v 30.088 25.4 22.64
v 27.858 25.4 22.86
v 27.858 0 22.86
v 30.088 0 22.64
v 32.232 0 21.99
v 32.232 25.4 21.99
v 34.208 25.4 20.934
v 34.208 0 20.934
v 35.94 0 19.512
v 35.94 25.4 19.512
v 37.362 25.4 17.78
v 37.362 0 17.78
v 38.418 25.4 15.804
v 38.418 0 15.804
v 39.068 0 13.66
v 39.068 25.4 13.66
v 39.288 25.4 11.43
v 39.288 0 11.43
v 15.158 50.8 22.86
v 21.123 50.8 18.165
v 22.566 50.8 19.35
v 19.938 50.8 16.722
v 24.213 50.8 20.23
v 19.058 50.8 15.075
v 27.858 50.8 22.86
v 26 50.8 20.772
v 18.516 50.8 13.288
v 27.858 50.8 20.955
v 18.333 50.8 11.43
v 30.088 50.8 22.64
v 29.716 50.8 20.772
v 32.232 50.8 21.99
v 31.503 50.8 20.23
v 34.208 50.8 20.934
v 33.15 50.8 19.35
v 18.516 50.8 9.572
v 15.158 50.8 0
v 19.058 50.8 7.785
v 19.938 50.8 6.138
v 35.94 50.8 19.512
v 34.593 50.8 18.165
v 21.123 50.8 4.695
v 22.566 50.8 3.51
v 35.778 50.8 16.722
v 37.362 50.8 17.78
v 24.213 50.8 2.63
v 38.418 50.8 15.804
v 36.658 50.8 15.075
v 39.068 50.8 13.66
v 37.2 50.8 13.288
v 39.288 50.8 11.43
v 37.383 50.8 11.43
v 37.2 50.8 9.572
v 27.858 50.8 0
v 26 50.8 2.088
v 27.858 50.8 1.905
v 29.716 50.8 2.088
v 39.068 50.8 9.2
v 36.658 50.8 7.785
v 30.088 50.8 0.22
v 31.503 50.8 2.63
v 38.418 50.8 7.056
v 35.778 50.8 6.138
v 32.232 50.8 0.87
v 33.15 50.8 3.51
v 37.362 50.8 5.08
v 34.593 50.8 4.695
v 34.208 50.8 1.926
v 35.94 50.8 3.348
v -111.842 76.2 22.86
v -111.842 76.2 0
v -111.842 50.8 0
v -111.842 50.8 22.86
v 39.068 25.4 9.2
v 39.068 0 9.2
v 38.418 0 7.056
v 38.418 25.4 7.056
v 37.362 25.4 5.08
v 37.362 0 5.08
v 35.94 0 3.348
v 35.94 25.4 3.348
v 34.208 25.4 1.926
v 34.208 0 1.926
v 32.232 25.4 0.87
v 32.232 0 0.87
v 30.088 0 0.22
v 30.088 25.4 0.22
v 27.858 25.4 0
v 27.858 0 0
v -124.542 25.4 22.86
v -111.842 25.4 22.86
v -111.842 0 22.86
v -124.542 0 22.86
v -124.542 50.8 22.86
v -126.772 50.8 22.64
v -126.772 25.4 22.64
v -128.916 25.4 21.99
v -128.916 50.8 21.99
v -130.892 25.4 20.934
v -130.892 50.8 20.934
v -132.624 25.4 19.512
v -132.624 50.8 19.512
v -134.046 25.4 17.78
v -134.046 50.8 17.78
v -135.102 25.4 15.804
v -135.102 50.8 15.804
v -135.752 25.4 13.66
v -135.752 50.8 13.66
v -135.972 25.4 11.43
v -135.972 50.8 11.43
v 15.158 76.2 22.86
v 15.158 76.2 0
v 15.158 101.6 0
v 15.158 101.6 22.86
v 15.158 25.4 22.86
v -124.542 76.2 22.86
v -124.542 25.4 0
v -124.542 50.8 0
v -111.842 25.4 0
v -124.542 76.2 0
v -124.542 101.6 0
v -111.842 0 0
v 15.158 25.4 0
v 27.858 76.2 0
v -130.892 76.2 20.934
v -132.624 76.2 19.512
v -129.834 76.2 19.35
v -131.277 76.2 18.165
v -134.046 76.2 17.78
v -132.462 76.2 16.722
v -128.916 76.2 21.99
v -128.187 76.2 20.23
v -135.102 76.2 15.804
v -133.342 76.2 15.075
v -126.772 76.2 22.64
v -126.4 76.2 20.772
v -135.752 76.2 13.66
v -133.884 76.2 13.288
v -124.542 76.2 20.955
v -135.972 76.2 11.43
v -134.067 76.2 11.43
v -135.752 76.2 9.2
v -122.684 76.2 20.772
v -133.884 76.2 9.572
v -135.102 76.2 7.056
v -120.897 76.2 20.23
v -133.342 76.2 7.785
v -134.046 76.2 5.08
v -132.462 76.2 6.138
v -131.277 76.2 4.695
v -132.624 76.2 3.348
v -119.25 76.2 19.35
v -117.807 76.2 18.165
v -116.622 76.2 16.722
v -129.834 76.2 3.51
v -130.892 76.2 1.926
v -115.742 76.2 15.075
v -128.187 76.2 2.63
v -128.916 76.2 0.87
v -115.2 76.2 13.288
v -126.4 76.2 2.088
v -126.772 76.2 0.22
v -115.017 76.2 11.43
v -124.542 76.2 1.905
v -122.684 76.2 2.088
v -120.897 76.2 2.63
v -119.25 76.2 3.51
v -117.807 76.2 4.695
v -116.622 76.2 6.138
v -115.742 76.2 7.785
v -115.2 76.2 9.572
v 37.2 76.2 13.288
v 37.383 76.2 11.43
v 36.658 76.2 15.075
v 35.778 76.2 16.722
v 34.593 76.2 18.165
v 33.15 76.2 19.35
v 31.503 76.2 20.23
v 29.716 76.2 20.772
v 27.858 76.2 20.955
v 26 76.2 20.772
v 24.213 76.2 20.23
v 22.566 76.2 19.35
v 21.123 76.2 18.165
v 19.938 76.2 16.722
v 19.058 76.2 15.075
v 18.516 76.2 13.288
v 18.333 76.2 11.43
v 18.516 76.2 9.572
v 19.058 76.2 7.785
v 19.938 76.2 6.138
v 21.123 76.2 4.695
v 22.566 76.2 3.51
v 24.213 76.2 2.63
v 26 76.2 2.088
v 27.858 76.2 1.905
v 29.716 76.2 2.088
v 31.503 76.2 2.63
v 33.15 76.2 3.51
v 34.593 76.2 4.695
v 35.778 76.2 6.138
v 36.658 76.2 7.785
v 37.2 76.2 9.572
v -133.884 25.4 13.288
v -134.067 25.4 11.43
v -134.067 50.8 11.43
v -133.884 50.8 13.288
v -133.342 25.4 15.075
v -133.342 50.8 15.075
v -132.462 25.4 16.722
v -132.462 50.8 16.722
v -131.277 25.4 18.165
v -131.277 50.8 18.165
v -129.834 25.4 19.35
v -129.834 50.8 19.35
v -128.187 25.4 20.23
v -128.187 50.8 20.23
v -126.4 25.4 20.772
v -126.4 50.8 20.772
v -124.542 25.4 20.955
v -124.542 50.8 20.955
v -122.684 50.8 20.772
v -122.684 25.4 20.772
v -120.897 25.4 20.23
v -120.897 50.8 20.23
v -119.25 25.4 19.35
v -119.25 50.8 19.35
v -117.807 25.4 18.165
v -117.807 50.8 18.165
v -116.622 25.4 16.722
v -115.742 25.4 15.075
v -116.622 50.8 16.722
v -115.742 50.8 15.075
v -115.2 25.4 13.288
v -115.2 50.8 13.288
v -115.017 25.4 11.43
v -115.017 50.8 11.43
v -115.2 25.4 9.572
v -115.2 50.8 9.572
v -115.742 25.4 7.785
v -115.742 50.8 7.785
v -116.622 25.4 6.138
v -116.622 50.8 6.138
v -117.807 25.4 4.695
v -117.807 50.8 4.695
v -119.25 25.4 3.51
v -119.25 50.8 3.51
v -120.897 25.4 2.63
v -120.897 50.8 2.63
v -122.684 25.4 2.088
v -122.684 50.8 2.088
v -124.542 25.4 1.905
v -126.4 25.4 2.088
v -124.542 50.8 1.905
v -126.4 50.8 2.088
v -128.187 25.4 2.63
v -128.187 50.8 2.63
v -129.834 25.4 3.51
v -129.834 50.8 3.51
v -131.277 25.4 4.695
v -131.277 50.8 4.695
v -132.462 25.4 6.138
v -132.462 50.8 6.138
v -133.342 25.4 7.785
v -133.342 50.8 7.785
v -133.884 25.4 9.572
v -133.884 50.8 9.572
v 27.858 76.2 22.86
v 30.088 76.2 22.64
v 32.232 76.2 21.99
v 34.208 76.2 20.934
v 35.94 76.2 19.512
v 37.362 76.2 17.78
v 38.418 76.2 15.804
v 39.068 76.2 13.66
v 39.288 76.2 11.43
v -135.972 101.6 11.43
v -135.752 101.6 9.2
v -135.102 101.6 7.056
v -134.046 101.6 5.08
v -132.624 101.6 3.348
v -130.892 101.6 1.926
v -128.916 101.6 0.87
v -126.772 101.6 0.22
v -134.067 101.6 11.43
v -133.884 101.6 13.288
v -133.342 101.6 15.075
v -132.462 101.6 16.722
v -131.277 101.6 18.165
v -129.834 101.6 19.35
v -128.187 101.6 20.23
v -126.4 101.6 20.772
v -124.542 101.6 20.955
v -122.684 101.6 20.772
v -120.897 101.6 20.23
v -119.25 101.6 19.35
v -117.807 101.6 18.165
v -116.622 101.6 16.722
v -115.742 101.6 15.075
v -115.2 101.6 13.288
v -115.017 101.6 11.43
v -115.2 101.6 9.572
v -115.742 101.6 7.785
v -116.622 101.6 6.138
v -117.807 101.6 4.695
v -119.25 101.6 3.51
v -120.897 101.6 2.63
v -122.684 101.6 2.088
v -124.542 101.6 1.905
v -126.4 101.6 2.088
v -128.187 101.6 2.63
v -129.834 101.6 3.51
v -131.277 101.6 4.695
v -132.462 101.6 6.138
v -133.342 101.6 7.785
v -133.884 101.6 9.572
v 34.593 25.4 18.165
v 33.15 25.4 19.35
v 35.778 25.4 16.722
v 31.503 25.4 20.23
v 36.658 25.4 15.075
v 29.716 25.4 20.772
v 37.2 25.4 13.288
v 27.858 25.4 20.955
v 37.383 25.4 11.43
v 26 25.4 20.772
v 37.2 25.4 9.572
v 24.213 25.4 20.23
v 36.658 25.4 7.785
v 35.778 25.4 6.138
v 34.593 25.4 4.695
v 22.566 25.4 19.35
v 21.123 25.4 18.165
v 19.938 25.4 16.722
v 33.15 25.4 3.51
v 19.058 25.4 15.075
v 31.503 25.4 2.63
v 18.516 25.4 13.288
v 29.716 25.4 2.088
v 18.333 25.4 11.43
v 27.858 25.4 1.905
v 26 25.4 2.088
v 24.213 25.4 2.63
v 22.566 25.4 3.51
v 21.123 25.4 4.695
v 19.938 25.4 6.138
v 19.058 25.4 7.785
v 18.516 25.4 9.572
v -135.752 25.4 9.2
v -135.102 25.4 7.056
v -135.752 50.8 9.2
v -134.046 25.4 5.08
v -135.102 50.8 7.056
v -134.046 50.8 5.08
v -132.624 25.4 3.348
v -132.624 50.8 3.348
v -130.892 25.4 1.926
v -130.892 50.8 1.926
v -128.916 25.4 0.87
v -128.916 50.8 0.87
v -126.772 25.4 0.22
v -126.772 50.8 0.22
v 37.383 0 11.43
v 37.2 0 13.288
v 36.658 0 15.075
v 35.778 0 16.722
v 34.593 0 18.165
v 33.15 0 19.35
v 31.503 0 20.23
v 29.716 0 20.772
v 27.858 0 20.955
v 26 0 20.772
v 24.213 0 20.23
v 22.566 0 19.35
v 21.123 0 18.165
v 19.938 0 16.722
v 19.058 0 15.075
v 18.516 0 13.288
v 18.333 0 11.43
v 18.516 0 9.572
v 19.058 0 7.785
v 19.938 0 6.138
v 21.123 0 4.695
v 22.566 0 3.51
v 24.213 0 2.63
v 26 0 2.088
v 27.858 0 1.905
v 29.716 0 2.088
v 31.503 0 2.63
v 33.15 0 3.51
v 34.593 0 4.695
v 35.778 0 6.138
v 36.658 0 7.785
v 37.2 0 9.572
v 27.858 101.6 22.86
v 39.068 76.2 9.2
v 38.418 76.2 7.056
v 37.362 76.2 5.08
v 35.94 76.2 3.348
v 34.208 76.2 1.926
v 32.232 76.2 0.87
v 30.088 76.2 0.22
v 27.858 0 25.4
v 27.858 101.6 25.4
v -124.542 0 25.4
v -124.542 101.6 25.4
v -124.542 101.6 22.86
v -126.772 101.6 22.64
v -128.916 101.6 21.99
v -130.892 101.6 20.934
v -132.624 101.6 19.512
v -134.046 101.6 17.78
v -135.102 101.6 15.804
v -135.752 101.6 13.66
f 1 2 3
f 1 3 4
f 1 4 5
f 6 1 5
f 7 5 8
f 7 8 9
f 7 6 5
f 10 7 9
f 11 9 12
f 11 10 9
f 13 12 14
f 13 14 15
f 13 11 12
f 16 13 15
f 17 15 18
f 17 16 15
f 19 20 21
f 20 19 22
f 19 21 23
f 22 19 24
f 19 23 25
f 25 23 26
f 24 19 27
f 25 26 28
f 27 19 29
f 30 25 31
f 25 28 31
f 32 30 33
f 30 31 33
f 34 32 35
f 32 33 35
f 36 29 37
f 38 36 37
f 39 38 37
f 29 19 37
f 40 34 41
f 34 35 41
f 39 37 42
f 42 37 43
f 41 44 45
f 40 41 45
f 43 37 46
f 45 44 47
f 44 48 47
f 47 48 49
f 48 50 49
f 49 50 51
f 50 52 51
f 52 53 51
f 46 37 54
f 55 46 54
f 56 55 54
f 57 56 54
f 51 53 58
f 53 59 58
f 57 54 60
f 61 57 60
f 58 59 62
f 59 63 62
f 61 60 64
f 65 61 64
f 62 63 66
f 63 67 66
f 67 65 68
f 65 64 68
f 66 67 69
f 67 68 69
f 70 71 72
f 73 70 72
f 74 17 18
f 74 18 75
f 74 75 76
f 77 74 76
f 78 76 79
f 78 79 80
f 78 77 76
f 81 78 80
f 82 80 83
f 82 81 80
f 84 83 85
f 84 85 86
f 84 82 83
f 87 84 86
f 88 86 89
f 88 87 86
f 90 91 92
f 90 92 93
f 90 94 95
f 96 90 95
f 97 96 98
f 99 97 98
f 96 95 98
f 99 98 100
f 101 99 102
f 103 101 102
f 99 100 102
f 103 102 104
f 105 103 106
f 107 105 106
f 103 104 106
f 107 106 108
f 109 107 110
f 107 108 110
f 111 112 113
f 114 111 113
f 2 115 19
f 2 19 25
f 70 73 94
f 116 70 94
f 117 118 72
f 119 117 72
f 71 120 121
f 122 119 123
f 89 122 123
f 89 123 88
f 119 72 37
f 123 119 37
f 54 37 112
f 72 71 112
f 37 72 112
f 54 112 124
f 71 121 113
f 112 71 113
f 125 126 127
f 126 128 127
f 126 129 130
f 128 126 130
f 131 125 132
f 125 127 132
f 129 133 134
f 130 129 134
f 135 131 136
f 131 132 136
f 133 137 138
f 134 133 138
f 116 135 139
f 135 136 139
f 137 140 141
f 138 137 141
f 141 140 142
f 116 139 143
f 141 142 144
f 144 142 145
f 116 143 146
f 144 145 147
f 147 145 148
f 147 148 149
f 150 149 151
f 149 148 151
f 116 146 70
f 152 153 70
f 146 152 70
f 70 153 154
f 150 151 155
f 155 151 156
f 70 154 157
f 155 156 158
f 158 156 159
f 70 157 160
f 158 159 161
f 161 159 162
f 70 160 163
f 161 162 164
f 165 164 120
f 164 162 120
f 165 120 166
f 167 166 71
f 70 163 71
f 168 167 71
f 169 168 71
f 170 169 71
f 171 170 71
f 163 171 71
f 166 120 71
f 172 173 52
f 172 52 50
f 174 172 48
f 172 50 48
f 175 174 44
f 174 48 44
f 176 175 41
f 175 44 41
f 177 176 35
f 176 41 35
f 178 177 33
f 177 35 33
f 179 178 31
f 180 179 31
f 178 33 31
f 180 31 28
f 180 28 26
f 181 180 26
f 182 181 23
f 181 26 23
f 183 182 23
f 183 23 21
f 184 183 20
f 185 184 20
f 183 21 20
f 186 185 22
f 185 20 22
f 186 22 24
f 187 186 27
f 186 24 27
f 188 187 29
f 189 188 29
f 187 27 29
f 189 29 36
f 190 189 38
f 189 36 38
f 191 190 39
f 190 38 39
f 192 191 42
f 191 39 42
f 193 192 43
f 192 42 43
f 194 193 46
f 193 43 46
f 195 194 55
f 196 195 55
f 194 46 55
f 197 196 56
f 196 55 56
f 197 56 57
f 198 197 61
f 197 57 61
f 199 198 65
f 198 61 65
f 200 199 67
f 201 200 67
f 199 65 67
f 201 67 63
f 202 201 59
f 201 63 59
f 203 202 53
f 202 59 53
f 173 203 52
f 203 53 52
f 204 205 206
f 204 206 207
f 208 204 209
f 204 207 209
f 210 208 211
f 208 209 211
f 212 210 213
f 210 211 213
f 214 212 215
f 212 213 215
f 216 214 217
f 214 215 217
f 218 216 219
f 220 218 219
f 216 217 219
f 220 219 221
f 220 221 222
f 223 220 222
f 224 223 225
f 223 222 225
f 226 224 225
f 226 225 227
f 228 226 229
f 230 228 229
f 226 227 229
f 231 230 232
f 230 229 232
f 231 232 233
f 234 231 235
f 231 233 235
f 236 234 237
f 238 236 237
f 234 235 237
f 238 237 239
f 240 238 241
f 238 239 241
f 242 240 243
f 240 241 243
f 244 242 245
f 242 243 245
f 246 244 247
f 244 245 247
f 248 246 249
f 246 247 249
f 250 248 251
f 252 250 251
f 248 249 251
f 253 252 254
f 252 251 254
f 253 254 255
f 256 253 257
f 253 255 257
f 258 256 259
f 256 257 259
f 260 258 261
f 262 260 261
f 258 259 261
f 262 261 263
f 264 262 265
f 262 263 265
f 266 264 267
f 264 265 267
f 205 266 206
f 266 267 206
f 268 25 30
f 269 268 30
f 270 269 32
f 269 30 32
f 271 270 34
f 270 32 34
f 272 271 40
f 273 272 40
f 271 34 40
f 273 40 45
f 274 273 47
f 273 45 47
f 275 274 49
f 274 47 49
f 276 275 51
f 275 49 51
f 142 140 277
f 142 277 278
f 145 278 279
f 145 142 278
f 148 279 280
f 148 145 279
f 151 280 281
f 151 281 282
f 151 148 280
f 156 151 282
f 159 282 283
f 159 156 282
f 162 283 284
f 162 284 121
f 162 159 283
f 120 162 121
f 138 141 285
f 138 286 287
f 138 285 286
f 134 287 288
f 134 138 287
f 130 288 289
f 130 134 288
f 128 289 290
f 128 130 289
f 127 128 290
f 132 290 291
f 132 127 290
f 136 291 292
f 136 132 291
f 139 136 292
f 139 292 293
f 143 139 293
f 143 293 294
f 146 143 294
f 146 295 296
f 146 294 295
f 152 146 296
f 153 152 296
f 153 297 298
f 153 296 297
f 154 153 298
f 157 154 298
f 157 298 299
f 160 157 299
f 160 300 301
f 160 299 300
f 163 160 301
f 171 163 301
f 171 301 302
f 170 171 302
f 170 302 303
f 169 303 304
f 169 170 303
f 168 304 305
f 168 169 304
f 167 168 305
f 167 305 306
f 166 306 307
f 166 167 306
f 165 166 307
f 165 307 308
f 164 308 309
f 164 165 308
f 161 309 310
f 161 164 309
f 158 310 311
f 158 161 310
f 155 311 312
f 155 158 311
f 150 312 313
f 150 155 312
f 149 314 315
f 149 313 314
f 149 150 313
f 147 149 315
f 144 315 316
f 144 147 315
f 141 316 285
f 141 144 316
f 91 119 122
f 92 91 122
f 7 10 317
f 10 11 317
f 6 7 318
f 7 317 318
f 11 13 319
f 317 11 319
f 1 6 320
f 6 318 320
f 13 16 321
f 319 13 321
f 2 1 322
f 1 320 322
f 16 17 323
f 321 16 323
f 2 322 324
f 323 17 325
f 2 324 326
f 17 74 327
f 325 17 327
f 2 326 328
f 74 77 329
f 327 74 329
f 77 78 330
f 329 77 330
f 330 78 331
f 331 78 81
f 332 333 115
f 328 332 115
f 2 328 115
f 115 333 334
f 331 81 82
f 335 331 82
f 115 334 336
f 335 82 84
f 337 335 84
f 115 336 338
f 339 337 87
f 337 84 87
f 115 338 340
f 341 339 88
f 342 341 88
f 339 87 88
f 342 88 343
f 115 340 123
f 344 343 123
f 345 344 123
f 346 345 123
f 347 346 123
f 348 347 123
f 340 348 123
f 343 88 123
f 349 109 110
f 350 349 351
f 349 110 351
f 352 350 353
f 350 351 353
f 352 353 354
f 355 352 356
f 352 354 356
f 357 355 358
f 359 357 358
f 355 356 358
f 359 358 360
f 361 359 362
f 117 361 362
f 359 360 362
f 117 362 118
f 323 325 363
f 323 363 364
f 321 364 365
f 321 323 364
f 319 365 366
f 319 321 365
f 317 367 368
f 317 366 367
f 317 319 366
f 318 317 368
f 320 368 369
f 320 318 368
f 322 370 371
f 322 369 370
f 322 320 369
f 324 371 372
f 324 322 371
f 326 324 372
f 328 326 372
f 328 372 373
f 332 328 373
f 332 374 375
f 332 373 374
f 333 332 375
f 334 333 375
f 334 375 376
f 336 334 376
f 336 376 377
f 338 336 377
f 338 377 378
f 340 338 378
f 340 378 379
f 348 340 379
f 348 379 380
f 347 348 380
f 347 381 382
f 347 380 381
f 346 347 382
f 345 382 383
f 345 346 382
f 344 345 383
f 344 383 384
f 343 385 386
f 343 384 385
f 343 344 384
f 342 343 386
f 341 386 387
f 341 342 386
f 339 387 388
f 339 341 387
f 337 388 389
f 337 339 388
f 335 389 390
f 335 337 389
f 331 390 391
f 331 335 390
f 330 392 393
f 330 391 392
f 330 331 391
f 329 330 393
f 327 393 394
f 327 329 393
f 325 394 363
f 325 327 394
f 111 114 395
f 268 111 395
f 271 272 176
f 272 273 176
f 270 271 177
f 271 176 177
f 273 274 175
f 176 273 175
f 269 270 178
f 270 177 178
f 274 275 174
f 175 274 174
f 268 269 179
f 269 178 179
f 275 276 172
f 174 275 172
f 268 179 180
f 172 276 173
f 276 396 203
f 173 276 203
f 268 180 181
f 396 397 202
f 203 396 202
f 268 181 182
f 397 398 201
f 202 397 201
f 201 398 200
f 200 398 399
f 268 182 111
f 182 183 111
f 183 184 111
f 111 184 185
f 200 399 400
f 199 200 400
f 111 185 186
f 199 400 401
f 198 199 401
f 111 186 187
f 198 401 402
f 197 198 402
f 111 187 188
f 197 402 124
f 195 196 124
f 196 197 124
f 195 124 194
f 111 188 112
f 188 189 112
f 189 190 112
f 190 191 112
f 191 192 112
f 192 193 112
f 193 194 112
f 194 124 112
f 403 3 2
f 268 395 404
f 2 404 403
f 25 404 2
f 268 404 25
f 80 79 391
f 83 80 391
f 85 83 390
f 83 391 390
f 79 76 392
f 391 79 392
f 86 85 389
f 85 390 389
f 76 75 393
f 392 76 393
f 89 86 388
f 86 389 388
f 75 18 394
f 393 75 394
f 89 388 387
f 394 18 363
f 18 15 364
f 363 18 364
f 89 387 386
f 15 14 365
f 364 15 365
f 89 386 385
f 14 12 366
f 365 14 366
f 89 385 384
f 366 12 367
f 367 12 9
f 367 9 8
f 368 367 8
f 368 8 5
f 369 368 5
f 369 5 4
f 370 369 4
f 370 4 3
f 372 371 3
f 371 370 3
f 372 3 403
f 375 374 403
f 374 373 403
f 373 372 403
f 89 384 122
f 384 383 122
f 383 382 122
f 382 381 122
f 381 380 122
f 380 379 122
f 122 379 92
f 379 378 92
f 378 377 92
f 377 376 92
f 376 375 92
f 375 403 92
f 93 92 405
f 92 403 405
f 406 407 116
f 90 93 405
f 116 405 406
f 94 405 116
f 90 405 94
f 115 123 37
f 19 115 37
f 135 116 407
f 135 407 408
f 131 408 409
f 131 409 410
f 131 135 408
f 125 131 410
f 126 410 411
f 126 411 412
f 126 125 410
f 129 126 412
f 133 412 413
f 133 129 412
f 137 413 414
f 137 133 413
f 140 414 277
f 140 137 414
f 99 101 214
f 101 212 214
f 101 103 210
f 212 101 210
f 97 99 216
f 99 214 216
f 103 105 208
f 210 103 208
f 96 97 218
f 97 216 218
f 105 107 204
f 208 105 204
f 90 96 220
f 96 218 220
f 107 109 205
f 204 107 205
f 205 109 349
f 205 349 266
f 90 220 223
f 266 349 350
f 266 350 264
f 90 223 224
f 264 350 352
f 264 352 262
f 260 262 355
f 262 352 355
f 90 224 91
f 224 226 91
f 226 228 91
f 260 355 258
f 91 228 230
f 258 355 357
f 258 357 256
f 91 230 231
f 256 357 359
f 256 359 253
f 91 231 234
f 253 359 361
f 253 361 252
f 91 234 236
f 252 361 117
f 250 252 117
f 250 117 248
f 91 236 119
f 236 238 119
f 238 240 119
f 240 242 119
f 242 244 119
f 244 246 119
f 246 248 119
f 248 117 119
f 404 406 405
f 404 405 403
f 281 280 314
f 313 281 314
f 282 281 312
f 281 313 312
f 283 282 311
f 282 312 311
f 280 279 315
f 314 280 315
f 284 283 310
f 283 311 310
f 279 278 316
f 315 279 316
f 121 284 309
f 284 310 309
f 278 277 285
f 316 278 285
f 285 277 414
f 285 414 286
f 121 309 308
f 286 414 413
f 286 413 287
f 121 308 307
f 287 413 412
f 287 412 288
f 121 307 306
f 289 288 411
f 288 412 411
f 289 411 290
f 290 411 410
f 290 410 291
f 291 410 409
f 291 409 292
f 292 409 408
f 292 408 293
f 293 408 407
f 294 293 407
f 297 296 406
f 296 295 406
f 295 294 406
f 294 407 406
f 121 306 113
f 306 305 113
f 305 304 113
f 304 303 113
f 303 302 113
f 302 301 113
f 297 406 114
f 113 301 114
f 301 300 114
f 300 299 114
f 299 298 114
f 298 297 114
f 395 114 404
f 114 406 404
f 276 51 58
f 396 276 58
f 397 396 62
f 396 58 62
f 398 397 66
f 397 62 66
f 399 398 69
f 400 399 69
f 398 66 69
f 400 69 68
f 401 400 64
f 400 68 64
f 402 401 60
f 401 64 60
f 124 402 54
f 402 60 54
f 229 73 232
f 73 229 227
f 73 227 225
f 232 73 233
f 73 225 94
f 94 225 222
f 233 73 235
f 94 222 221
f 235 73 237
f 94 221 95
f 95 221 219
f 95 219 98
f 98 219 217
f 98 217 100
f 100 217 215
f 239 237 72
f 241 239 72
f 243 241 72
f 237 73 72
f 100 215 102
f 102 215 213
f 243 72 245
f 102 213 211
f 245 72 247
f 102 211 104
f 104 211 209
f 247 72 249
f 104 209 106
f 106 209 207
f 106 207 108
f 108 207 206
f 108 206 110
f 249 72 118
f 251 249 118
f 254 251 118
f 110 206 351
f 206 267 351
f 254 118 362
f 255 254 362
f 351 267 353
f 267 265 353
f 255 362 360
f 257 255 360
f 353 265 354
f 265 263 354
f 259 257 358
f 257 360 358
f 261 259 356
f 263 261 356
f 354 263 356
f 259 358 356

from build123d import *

# Parameters (mm, degrees)
F1_DEPTH      = 25.4
F3_DEPTH      = 25.4
F3_DEPTH_BACK = 50.801
F2_R          = 9.525
F4_DEPTH      = 25.4
F4_DEPTH_BACK = 50.801
F2_W          = 12.7
F2_H          = 2.54
F5_DEPTH      = 25.4
F5_DEPTH_BACK = 50.8
F7_DEPTH      = 25.4
F7_DEPTH_BACK = 50.801
F6_R          = 9.525
F8_DEPTH      = 25.4
F8_DEPTH_BACK = 50.801
F6_W          = 12.7
F6_H          = 2.54
F9_DEPTH      = 25.4
F9_DEPTH_BACK = 50.8


with BuildPart() as f1:
    # F0 (on Top) → F1 (new body)
    with BuildSketch(Plane.XY):
        Polygon((15.1580646015, 101.6), (-137.2419353985, 101.6), (-137.2419353985, 76.2), (-111.8419353985, 76.2), (-111.8419353985, 50.8), (-137.2419353985, 50.8), (-137.2419353985, 25.4), (-111.8419353985, 25.4), (-111.8419353985, 0), (40.5580646015, 0), (40.5580646015, 25.4), (15.1580646015, 25.4), (15.1580646015, 50.8), (40.5580646015, 50.8), (40.5580646015, 76.2), (15.1580646015, 76.2), align=None)
    extrude(amount=F1_DEPTH)

    # F2 (on face) → F3 (cut, two sides)
    with BuildSketch(Plane(origin=(0, 50.8, 0), x_dir=(-1, 0, 0), z_dir=(0, 1, 0))) as f3_sk:
        with BuildLine():
            ThreePointArc((124.5419353985, 22.86), (132.6241659074, 19.512230509), (135.9719353985, 11.43))
            ThreePointArc((135.9719353985, 11.43), (132.6241659074, 3.347769491), (124.5419353985, 0))
            Line((124.5419353985, 0), (137.2419353985, 0))
            Line((137.2419353985, 0), (137.2419353985, 25.4))
            Line((137.2419353985, 25.4), (124.5419353985, 25.4))
            Line((124.5419353985, 25.4), (124.5419353985, 22.86))
        make_face()
    extrude(amount=-F3_DEPTH, mode=Mode.SUBTRACT)
    extrude(f3_sk.sketch, amount=F3_DEPTH_BACK, mode=Mode.SUBTRACT)

    # F2 (on face) → F4 (cut, two sides)
    with BuildSketch(Plane(origin=(0, 50.8, 0), x_dir=(-1, 0, 0), z_dir=(0, 1, 0))) as f4_sk:
        with Locations((124.5419353985, 11.43)):
            Circle(F2_R)
    extrude(amount=-F4_DEPTH, mode=Mode.SUBTRACT)
    extrude(f4_sk.sketch, amount=F4_DEPTH_BACK, mode=Mode.SUBTRACT)

    # F2 (on face) → F5 (join, two sides)
    with BuildSketch(Plane(origin=(0, 50.8, 0), x_dir=(-1, 0, 0), z_dir=(0, 1, 0))) as f5_sk:
        with Locations((118.1919353985, 24.13)):
            Rectangle(F2_W, F2_H)
    extrude(amount=F5_DEPTH)
    extrude(f5_sk.sketch, amount=-F5_DEPTH_BACK)

    # F6 (on face) → F7 (cut, two sides)
    with BuildSketch(Plane.XZ.offset(-50.8)) as f7_sk:
        with BuildLine():
            ThreePointArc((27.8580646015, 22.86), (35.9402951105, 19.512230509), (39.2880646015, 11.43))
            ThreePointArc((39.2880646015, 11.43), (35.9402951105, 3.347769491), (27.8580646015, 0))
            Line((27.8580646015, 0), (40.5580646015, 0))
            Line((40.5580646015, 0), (40.5580646015, 25.4))
            Line((40.5580646015, 25.4), (27.8580646015, 25.4))
            Line((27.8580646015, 25.4), (27.8580646015, 22.86))
        make_face()
    extrude(amount=-F7_DEPTH, mode=Mode.SUBTRACT)
    extrude(f7_sk.sketch, amount=F7_DEPTH_BACK, mode=Mode.SUBTRACT)

    # F6 (on face) → F8 (cut, two sides)
    with BuildSketch(Plane.XZ.offset(-50.8)) as f8_sk:
        with Locations((27.8580646015, 11.43)):
            Circle(F6_R)
    extrude(amount=-F8_DEPTH, mode=Mode.SUBTRACT)
    extrude(f8_sk.sketch, amount=F8_DEPTH_BACK, mode=Mode.SUBTRACT)

    # F6 (on face) → F9 (join, two sides)
    with BuildSketch(Plane.XZ.offset(-50.8)) as f9_sk:
        with Locations((21.5080646015, 24.13)):
            Rectangle(F6_W, F6_H)
    extrude(amount=F9_DEPTH)
    extrude(f9_sk.sketch, amount=-F9_DEPTH_BACK)


solid = f1.part
